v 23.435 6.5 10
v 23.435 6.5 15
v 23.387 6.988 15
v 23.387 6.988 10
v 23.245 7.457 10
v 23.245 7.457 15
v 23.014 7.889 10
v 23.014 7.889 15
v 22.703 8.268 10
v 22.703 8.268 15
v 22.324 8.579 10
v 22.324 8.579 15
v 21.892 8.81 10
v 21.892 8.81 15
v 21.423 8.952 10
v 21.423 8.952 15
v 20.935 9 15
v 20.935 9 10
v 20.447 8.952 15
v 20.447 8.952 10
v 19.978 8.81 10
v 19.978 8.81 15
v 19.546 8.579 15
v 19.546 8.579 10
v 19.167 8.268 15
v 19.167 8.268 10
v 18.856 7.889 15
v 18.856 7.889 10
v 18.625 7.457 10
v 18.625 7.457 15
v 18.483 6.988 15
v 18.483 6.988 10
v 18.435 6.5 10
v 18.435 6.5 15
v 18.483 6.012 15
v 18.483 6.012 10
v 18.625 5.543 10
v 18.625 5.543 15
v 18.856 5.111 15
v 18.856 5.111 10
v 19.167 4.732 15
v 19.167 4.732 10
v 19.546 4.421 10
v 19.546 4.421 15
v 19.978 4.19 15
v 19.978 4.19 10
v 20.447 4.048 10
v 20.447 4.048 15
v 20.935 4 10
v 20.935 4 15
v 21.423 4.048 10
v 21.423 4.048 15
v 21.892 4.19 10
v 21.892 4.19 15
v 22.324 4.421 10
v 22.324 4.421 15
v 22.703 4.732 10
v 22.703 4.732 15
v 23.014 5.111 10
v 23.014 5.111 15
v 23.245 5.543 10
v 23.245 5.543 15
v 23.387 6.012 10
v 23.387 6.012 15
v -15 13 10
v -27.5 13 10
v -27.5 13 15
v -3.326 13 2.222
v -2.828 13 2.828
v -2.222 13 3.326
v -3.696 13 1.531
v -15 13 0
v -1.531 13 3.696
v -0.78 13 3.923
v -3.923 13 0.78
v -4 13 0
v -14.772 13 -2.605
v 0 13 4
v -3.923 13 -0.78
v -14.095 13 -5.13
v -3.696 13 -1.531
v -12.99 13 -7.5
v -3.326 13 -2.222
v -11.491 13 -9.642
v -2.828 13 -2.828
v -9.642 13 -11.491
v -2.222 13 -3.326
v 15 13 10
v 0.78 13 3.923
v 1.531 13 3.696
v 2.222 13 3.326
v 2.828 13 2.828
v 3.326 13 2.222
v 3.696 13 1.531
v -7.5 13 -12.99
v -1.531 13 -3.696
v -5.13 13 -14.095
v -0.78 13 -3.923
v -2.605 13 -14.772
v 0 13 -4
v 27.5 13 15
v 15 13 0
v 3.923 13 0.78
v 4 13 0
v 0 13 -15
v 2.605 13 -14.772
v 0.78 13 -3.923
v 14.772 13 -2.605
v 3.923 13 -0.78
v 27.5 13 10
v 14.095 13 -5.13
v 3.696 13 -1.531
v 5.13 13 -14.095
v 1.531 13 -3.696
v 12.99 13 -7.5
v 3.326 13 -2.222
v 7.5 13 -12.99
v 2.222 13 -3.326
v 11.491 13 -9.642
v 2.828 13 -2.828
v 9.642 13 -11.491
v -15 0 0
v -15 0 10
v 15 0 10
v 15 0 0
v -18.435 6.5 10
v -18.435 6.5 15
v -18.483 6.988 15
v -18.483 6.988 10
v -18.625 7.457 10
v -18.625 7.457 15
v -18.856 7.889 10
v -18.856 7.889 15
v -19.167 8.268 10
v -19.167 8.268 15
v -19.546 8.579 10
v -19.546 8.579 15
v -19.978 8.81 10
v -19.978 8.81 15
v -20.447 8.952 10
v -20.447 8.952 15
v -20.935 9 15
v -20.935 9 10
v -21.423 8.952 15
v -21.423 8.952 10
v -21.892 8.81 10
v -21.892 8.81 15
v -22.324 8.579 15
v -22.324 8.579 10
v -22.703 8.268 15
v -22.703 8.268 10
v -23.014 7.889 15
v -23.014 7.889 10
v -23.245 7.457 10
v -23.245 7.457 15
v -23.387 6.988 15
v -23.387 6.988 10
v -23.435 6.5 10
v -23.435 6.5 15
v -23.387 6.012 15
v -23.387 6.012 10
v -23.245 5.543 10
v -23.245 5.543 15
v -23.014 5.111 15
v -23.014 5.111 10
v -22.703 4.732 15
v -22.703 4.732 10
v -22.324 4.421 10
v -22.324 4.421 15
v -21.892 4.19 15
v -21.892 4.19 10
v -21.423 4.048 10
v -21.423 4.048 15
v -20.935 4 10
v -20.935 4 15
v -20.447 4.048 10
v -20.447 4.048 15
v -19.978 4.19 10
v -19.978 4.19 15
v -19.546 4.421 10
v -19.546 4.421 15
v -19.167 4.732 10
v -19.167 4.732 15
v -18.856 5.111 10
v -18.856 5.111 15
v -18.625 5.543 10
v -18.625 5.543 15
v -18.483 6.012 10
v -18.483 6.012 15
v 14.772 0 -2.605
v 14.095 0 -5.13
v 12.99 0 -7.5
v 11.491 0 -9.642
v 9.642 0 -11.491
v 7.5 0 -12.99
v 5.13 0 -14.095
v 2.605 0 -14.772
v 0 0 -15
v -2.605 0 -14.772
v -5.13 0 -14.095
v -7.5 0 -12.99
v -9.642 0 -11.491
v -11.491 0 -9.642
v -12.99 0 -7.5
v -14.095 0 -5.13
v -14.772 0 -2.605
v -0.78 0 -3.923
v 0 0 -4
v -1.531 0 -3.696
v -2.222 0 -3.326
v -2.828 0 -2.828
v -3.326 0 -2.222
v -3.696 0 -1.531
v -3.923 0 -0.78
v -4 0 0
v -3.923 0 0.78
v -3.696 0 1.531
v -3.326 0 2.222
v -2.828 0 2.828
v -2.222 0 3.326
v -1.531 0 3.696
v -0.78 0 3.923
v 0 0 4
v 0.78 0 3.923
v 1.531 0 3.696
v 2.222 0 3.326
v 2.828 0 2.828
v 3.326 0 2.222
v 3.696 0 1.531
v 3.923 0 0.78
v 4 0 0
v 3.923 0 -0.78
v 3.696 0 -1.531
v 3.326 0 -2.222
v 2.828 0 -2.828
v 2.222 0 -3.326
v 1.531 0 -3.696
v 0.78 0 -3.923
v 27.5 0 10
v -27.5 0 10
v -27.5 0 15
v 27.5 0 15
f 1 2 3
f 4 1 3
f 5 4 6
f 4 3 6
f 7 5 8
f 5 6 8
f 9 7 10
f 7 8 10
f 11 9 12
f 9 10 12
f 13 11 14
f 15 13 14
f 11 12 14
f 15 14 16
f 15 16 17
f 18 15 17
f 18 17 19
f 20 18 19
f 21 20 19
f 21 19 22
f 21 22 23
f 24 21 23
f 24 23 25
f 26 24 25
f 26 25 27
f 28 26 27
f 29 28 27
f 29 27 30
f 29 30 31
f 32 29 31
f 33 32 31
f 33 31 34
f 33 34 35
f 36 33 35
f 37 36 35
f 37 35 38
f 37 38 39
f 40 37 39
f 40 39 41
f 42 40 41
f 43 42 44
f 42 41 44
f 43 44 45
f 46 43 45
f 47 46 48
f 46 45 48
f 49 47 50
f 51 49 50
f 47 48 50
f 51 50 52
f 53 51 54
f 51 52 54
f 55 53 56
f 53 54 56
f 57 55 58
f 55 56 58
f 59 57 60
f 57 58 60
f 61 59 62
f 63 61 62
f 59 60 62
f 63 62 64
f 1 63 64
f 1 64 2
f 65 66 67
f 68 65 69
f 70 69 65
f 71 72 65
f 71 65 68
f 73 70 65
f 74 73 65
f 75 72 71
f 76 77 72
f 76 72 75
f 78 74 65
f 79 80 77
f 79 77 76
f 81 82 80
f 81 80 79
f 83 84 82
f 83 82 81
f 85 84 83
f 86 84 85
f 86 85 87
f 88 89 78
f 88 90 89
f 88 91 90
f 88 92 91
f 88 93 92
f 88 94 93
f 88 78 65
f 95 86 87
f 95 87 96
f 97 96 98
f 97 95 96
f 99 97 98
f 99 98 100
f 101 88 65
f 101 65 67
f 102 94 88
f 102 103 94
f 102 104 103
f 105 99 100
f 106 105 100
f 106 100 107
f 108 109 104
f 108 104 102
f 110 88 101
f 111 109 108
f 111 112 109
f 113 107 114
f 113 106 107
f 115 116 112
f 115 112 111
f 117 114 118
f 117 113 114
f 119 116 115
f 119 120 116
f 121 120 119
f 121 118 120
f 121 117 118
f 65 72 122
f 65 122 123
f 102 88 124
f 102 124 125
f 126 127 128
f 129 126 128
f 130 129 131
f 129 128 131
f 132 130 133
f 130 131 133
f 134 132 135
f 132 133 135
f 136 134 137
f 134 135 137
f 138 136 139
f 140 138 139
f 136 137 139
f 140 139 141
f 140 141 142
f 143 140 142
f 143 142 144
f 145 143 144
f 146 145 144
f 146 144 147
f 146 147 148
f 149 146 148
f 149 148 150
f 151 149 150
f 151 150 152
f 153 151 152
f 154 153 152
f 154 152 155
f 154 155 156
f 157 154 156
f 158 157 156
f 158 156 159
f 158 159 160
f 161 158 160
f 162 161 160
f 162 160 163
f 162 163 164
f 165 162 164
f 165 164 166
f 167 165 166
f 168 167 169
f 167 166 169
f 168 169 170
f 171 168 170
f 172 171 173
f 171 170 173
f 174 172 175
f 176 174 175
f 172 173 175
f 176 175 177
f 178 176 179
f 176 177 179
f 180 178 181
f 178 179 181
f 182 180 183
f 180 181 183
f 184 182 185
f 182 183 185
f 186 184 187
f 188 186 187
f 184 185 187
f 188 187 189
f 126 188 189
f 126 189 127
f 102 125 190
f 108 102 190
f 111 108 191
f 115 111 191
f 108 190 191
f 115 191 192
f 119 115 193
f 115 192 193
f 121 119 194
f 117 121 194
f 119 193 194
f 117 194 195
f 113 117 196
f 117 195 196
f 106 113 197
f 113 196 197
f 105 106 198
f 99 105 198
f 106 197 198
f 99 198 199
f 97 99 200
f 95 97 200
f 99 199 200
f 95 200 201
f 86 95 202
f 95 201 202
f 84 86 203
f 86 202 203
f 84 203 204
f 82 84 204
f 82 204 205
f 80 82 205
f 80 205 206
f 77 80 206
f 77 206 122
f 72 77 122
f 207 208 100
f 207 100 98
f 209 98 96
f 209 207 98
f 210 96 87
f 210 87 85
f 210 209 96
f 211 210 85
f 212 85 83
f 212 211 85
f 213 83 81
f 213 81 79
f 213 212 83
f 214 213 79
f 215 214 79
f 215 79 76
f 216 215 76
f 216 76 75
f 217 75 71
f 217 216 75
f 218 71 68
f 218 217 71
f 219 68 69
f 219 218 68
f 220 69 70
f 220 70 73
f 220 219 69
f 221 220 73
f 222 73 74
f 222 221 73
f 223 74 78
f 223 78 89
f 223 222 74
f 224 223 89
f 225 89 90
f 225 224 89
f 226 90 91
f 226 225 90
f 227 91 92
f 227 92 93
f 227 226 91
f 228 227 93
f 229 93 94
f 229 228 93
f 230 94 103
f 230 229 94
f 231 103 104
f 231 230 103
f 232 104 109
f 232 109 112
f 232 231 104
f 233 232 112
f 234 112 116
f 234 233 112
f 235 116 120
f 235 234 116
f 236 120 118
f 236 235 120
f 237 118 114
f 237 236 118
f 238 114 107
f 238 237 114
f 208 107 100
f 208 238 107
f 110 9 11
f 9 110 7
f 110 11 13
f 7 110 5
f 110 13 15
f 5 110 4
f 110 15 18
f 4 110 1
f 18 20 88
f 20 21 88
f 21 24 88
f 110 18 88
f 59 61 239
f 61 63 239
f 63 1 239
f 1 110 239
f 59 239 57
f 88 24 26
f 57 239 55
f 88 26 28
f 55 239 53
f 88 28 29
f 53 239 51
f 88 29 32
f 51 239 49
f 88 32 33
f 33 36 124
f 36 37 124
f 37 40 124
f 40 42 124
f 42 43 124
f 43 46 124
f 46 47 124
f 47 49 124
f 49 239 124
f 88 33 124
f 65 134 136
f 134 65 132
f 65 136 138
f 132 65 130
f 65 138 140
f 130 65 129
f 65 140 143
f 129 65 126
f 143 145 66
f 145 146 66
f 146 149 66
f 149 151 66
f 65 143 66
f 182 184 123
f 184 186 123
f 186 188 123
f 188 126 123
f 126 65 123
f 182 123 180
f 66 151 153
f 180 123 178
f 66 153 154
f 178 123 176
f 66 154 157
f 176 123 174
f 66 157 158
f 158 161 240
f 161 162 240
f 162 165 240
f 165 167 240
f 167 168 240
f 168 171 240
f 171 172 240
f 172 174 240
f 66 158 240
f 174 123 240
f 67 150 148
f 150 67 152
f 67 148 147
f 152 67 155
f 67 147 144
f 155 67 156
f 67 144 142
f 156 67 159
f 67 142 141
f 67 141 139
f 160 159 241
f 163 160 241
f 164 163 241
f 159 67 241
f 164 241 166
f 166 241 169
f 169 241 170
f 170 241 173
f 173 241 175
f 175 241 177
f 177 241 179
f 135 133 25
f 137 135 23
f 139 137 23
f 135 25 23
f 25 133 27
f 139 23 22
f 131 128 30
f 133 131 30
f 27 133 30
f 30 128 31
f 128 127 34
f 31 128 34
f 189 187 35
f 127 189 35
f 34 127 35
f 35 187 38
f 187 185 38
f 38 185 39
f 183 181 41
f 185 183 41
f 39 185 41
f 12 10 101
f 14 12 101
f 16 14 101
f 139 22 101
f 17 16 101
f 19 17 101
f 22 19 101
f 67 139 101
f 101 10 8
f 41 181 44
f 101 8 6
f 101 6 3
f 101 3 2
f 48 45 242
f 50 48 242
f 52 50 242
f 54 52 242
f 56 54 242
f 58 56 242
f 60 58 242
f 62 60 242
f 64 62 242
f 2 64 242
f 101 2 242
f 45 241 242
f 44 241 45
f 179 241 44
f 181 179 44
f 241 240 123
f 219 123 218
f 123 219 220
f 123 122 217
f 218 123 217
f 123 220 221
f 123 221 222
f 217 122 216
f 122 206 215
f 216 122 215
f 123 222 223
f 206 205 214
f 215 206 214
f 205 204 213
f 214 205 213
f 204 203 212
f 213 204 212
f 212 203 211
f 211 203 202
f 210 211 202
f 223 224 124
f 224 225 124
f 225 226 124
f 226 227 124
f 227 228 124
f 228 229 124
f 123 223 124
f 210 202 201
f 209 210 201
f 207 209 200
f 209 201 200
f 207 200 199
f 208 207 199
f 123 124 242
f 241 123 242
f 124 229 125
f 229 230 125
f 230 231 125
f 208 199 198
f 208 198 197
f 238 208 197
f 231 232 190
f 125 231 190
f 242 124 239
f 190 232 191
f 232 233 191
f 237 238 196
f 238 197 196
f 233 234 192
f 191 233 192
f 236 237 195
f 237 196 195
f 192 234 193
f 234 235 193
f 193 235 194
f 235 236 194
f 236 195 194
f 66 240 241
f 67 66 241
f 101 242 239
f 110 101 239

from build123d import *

# Parameters (mm, degrees)
SKETCH1_R            = 4
BOSS_EXTRUDE1_DEPTH  = 13
M4_CLEARANCE_HOLE1_D = 5


with BuildPart() as part:
    # Sketch1 → Boss-Extrude1 (new body)
    with BuildSketch(Plane(origin=(0, 0, 0), x_dir=(1, 0, 0), z_dir=(0, 1, 0))):
        with BuildLine():
            Line((-15, 0), (-15, -10))
            Line((-15, -10), (-27.5, -10))
            Line((-27.5, -10), (-27.5, -15))
            Line((-27.5, -15), (27.5, -15))
            Line((27.5, -15), (27.5, -10))
            Line((27.5, -10), (15, -10))
            Line((15, -10), (15, 0))
            ThreePointArc((15, 0), (0, 15), (-15, 0))
        make_face()
        with Locations(Location((0, 0, 0), (0, 0, 90))):
            Circle(SKETCH1_R, mode=Mode.SUBTRACT)
    extrude(amount=BOSS_EXTRUDE1_DEPTH)

    # M4 Clearance Hole1 (through all)
    with Locations(Plane(origin=(0, 0, 10), x_dir=(-1, 0, 0), z_dir=(0, 0, -1))):
        with Locations((-20.935, 6.5), (20.935, 6.5)):
            Hole(M4_CLEARANCE_HOLE1_D / 2)


solid = part.part
